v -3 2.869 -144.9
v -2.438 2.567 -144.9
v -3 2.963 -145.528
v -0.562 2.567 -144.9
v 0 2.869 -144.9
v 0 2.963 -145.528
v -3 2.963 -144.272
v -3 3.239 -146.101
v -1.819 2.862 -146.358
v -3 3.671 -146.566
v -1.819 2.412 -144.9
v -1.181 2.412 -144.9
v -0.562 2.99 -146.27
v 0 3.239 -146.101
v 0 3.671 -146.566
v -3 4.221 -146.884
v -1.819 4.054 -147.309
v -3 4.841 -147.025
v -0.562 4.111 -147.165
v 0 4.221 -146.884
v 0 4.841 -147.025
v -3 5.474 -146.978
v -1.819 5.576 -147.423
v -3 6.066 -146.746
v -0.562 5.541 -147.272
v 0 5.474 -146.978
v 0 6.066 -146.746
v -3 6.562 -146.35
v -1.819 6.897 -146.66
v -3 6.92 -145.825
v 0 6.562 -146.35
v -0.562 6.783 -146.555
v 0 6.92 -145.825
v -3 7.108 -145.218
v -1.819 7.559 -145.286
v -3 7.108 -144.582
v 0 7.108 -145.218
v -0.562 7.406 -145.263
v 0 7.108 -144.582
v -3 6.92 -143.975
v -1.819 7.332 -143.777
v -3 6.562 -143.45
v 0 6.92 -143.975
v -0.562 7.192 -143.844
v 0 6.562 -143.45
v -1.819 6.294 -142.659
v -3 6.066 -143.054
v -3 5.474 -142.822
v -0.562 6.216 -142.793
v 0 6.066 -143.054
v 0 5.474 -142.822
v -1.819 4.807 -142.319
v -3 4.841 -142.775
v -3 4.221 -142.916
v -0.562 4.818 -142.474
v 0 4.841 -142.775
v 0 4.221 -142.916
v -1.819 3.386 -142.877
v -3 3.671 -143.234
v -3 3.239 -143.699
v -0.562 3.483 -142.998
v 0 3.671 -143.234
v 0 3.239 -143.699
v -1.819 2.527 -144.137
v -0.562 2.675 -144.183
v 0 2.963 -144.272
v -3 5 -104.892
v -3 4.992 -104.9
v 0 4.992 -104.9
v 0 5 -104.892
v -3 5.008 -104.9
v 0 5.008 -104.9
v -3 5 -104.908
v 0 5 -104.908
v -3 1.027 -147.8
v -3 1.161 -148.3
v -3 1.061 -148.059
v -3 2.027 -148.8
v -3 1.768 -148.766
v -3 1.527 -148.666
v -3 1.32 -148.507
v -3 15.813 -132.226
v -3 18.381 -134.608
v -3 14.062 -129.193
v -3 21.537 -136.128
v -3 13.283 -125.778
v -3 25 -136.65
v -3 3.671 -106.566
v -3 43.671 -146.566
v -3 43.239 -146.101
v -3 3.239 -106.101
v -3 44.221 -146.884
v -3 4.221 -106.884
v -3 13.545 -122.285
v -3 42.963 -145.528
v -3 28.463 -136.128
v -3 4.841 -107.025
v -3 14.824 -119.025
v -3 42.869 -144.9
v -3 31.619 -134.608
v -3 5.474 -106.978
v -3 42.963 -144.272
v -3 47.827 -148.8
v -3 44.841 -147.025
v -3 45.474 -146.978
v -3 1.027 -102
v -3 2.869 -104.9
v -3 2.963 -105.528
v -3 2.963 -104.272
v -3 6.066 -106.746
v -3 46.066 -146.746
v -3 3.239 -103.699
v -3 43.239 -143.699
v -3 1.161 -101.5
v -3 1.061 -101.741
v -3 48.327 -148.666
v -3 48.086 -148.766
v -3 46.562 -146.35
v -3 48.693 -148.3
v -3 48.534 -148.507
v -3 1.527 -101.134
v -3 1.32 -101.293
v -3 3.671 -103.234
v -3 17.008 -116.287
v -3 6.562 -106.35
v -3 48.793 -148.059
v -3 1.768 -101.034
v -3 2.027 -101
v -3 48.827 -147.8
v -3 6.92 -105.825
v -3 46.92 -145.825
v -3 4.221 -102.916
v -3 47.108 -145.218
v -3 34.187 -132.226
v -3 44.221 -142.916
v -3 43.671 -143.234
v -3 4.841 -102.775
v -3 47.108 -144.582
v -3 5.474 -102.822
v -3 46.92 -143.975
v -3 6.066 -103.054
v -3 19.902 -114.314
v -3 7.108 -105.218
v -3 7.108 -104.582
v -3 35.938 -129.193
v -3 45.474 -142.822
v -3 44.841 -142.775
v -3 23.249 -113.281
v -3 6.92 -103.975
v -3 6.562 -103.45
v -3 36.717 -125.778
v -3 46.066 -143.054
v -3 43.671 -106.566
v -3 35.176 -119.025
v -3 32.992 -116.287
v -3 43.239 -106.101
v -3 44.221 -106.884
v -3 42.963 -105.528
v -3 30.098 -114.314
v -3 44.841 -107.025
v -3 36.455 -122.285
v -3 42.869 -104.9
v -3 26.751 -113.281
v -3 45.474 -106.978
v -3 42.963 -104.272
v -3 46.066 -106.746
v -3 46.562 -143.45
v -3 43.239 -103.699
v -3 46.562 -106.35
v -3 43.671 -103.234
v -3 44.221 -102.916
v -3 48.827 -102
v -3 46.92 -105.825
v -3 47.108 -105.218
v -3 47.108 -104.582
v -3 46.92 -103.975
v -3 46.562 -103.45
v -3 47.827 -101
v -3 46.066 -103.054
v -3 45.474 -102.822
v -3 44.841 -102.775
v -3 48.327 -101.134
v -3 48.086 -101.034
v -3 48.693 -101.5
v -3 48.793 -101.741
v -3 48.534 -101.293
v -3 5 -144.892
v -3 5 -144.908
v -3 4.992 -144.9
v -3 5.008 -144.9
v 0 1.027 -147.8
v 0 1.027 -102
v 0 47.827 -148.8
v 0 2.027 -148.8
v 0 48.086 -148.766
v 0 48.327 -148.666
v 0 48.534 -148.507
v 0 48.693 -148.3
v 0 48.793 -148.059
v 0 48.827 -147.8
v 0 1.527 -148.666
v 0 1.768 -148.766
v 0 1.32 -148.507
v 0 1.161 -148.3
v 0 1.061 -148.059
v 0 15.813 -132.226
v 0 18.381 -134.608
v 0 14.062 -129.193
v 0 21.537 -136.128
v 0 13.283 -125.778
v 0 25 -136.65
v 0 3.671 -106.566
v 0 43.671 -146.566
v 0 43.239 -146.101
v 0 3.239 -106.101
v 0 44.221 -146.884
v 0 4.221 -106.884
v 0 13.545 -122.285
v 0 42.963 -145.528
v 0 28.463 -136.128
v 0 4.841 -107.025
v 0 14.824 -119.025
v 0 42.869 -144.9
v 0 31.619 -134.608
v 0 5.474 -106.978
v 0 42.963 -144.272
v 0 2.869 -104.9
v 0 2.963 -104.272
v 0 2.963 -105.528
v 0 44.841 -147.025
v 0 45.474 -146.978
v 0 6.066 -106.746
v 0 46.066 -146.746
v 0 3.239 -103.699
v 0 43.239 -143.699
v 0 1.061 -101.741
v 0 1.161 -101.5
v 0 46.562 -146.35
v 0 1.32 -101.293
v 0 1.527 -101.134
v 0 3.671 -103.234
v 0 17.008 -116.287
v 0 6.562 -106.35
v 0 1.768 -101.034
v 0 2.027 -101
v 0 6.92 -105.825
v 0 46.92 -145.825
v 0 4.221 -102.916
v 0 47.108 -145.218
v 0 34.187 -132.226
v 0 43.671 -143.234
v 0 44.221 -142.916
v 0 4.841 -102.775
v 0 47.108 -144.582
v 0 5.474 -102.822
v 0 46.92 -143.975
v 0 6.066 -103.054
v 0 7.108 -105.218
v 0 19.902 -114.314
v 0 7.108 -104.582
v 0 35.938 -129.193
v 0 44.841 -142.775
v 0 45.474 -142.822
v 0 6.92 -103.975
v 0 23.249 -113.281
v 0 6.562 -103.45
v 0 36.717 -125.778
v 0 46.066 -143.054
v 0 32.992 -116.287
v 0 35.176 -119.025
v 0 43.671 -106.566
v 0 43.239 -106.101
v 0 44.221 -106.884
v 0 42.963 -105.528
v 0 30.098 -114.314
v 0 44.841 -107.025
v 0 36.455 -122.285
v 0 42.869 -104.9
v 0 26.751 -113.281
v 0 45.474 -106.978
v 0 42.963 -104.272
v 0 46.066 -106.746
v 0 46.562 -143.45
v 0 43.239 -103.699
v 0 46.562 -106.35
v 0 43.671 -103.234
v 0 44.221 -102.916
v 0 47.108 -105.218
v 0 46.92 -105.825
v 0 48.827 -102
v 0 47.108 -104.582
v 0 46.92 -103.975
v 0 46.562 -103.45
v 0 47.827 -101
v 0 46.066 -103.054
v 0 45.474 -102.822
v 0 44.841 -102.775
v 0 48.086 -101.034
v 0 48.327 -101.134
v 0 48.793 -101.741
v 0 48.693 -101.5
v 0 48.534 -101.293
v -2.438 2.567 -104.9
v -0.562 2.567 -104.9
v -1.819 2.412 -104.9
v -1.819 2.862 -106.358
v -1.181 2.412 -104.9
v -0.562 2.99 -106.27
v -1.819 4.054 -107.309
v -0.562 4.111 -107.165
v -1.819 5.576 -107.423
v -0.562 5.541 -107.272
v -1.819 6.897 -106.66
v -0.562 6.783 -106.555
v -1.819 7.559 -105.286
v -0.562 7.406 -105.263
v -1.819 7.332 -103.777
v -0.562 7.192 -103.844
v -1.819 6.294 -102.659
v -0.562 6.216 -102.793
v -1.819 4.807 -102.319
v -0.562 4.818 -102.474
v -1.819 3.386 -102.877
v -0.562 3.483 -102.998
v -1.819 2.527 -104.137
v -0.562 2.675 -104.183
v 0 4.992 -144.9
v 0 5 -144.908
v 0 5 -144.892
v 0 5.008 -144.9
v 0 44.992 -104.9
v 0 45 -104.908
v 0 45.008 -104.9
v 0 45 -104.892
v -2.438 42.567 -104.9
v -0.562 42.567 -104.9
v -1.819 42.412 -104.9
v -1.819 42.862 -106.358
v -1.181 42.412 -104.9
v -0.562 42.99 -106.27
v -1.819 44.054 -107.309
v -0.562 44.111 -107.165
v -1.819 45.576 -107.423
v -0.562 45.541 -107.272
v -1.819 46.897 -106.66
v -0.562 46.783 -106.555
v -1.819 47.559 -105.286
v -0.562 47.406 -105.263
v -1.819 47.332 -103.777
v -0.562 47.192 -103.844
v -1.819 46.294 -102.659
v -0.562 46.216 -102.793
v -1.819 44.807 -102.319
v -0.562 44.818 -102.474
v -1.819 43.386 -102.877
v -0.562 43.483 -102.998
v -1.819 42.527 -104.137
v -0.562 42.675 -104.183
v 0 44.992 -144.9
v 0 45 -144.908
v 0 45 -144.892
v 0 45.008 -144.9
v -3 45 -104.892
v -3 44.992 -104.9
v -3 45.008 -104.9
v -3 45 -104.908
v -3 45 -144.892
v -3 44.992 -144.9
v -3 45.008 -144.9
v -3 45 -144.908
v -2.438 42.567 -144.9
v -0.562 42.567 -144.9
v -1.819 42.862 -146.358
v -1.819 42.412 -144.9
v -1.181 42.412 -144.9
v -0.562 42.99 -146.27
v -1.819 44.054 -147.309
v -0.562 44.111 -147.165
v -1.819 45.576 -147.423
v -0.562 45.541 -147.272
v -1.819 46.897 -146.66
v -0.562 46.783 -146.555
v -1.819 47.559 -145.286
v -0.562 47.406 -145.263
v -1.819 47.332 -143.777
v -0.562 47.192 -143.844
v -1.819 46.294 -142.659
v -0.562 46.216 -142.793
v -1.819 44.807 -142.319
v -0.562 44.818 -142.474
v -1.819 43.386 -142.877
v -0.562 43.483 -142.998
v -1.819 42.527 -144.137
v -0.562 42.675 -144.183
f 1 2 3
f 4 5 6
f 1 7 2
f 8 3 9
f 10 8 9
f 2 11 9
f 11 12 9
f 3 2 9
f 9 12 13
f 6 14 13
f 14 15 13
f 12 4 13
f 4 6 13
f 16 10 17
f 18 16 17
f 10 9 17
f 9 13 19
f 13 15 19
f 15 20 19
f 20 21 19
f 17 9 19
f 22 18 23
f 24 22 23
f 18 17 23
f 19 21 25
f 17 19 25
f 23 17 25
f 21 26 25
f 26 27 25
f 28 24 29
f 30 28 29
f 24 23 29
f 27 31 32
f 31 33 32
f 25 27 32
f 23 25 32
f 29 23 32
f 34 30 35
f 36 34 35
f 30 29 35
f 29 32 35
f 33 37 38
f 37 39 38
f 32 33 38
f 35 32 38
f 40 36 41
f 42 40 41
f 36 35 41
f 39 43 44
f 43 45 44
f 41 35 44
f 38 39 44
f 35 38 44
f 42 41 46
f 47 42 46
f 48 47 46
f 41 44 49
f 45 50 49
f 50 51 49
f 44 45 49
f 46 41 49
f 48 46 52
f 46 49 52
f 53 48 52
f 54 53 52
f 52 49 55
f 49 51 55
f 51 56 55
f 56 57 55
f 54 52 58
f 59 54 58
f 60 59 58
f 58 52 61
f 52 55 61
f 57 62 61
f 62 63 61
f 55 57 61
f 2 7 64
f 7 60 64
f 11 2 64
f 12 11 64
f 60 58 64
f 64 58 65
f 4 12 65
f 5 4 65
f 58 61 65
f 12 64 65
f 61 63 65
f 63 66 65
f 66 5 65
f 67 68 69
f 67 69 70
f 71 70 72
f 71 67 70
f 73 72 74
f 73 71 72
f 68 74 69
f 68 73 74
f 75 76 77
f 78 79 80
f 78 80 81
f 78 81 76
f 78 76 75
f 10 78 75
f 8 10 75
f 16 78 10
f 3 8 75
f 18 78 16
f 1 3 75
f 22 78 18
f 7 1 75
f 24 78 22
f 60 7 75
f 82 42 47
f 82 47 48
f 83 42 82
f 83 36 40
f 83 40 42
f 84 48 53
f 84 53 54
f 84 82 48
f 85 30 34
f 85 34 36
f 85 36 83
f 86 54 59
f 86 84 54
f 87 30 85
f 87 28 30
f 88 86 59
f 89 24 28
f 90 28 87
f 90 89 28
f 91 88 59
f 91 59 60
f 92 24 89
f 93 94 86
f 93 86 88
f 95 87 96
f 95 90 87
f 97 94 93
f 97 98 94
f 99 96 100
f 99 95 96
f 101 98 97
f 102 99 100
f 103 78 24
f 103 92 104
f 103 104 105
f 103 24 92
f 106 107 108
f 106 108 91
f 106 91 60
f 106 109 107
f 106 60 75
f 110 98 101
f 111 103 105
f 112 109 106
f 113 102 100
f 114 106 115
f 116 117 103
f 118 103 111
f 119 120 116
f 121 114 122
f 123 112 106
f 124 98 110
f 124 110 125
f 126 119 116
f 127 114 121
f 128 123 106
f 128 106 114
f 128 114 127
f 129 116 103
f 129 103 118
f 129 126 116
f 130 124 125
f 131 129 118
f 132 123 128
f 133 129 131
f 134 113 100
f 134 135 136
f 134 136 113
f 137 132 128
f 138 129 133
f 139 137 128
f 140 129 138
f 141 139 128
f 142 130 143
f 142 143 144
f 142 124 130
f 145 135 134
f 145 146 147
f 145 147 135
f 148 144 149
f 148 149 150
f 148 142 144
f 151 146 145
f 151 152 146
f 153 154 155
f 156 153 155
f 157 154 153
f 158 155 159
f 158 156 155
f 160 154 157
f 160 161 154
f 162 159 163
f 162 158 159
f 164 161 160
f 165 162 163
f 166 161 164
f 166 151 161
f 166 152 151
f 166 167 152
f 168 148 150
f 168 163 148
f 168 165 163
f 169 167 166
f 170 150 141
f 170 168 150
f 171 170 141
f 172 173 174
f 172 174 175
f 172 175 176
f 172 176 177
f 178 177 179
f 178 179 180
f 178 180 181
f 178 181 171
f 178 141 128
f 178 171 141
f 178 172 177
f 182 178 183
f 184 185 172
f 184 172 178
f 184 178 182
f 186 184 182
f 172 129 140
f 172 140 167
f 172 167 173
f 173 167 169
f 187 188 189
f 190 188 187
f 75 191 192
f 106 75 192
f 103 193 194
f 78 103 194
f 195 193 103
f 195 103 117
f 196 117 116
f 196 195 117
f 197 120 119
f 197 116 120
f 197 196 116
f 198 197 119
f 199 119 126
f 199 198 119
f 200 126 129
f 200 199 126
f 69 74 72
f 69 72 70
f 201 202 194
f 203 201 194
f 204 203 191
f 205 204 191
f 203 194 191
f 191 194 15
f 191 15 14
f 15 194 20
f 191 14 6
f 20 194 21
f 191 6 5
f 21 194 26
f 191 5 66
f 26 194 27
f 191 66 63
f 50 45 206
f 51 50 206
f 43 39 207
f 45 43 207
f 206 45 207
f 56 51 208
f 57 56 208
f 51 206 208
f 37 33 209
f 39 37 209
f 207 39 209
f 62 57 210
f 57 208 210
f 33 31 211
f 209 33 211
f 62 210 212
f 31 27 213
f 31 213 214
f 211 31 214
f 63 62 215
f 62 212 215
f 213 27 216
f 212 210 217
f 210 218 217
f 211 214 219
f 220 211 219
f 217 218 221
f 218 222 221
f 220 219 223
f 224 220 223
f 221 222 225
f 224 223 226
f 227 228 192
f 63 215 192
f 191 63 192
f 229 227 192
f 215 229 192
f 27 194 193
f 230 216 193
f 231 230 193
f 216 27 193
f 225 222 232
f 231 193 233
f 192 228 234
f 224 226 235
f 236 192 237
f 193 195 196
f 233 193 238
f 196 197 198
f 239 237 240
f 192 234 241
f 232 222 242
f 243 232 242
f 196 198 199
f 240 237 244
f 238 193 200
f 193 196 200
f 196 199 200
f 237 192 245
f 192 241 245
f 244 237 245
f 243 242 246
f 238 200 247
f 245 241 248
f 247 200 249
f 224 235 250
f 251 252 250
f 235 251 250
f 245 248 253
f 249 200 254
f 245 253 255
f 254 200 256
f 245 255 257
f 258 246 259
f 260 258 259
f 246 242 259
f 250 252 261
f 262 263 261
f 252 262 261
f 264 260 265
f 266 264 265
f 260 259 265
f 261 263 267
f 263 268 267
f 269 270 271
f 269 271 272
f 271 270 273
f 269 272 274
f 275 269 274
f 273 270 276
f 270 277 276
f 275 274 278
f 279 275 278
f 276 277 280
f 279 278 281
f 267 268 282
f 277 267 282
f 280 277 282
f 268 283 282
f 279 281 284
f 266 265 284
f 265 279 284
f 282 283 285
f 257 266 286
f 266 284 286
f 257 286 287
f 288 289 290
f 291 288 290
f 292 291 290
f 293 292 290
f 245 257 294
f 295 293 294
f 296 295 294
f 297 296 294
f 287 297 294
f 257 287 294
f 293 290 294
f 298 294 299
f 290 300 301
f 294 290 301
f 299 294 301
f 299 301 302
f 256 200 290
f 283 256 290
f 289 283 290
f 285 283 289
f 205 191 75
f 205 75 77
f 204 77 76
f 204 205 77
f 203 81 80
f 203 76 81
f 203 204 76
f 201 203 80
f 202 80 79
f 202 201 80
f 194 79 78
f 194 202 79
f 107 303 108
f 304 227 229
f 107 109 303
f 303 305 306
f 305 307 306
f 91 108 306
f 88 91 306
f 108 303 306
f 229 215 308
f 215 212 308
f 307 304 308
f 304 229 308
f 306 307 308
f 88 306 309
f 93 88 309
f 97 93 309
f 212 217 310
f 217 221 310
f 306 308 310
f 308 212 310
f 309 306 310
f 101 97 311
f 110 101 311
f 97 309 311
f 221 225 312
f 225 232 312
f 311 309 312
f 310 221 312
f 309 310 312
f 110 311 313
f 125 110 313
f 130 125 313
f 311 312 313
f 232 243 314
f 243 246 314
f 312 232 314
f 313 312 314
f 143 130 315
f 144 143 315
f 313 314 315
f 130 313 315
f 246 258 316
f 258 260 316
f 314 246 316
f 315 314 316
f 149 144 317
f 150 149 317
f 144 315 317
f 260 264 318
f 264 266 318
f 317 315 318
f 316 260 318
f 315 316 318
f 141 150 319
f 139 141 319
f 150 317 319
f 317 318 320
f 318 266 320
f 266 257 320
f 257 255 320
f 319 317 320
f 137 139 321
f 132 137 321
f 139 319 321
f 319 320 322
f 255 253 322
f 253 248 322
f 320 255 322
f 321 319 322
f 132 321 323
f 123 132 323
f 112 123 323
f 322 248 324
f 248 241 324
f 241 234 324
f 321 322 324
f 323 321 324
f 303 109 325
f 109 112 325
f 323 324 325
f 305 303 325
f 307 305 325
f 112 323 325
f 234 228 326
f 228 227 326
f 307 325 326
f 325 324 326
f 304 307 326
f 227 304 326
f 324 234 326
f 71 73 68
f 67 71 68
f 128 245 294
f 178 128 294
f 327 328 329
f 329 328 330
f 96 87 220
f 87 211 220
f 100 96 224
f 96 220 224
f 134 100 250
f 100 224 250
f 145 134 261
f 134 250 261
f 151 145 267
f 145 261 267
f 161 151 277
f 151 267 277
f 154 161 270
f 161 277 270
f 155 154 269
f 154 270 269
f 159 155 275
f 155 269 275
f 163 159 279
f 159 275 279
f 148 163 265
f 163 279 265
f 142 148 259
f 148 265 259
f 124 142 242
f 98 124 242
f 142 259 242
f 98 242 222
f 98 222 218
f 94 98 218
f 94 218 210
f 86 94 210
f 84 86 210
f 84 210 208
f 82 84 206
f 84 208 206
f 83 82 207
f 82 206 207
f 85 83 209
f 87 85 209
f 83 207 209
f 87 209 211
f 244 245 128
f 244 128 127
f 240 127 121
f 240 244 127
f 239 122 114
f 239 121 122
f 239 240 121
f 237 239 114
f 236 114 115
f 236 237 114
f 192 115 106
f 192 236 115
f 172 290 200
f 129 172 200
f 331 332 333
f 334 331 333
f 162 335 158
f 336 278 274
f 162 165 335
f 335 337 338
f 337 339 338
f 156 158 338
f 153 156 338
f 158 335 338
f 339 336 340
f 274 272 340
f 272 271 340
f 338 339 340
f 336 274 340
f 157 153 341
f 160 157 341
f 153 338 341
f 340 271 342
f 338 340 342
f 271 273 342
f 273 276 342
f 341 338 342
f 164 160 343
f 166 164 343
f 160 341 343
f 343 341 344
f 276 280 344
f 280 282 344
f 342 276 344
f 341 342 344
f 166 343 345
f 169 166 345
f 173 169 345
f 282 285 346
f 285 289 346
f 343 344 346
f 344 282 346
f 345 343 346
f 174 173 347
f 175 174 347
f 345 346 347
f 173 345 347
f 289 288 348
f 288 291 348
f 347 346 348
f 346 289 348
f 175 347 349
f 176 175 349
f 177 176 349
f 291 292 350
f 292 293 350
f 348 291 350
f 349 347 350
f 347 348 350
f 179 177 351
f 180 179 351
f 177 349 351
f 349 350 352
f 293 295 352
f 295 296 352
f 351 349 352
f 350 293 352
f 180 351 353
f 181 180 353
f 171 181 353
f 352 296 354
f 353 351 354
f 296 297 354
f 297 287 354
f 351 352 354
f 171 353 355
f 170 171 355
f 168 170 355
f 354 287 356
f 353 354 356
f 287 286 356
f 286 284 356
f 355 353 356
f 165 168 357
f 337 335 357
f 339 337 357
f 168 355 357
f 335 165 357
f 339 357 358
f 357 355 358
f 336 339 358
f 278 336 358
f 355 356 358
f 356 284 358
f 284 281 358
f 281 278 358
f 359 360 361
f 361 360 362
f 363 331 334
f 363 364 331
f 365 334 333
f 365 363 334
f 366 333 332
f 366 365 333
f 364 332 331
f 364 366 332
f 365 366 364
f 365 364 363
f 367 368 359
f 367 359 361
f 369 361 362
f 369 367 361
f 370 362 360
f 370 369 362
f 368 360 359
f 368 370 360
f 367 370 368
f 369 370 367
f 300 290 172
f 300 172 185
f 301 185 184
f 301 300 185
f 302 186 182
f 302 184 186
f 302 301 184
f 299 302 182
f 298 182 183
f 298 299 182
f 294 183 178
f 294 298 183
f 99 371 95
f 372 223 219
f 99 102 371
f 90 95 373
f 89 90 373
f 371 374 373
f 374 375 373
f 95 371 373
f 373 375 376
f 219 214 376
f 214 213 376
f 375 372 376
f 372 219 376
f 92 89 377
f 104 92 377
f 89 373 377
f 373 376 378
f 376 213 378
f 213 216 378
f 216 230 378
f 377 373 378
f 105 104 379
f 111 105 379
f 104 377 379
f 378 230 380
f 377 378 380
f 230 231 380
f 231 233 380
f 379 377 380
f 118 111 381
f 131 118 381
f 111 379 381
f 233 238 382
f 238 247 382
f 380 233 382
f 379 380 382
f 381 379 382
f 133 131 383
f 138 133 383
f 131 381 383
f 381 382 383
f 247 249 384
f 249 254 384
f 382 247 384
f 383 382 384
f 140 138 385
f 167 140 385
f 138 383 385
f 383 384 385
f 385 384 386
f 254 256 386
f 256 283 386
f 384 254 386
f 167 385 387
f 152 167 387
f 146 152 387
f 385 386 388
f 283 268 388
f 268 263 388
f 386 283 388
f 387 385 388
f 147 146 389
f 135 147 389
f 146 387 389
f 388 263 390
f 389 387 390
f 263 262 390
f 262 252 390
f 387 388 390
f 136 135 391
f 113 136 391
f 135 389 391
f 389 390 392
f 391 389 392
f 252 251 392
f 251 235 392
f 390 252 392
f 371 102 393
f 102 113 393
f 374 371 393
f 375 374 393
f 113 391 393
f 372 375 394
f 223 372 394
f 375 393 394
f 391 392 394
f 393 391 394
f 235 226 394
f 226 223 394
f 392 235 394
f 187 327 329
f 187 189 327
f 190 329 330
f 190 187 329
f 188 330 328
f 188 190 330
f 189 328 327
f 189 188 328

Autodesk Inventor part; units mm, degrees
ref_plane "YZ Plane" through (0, 0, 0) normal (1, 0, 0) x (0, 1, 0)
ref_plane "XZ Plane" through (0, 0, 0) normal (0, 1, 0) x (-1, 0, 0)
ref_plane "XY Plane" through (0, 0, 0) normal (0, 0, 1) x (1, 0, 0)
ref_plane "Arbeitsebene1" through (0, 0, -149.8) normal (-1, 0, 0) x (0, 0, 1)
sketch "Skizze1" plane through (0, 0, -149.8) normal (-1, 0, 0) x (0, 0, 1)
  circle A0 centre (44.9, 5) radius 1.5 construction
  circle A1 centre (4.9, 5) radius 1.5 construction
  circle A2 centre (4.9, 45) radius 1.6 construction
  circle A3 centre (44.9, 45) radius 1.6 construction
  line L0 (39.5269, 16.1776) -> (39.5269, 39.7) construction
  line L1 (16.0815, 10.3) -> (33.7185, 10.3) construction
  line L2 (10.2731, 16.1776) -> (10.2731, 39.7) construction
  circle A4 centre (24.9, 24.9269) radius 14.6269 construction
  line L3 (2, 49.8269) -> (47.8, 49.8269)
  line L4 (49.8, 47.8269) -> (49.8, 2.0269)
  line L5 (47.8, 0.0269) -> (2, 0.0269)
  line L6 (0, 2.0269) -> (0, 47.8269)
  line L7 (0, 49.8269) -> (49.8, 0.0269) construction
  line L8 (49.8, 49.8269) -> (0, 0.0269) construction
  arc A5 (47.8, 0.0269) -> (49.8, 2.0269) centre (47.8, 2.0269) ccw
  arc A6 (0, 2.0269) -> (2, 0.0269) centre (2, 2.0269) ccw
  arc A7 (2, 49.8269) -> (0, 47.8269) centre (2, 47.8269) ccw
  arc A8 (49.8, 47.8269) -> (47.8, 49.8269) centre (47.8, 47.8269) ccw
  line L9 (2, 1.0269) -> (47.8, 1.0269)
  arc A9 (47.8, 1.0269) -> (48.8, 2.0269) centre (47.8, 2.0269) ccw
  line L10 (48.8, 2.0269) -> (48.8, 47.8269)
  arc A10 (48.8, 47.8269) -> (47.8, 48.8269) centre (47.8, 47.8269) ccw
  line L11 (47.8, 48.8269) -> (2, 48.8269)
  arc A11 (2, 48.8269) -> (1, 47.8269) centre (2, 47.8269) ccw
  line L12 (1, 47.8269) -> (1, 2.0269)
  arc A12 (1, 2.0269) -> (2, 1.0269) centre (2, 2.0269) ccw
  point P0 (149.8, 0)
extrude "Extrusion1" add sketch "Skizze1" along normal blind 3 contours A12 L12 A11 L11 A10 L10 A9 L9
ref_plane "Arbeitsebene2" through (0, 5, -104.9) normal (0, 0, 1) x (1, 0, 0)
sketch "Skizze2" plane through (0, 5, -104.9) normal (0, 0, 1) x (1, 0, 0)
  line L0 (0, 5.3) -> (7, 5.3) projected
  line L1 (0, 8.3139) -> (7.3731, 8.3139)
  line L2 (0, -2.9731) -> (0, 42.8269) projected
  line L3 (0, 6.807) -> (-3, 6.807)
  line L4 (-3, -2.9731) -> (-3, 42.8269) projected
  circle A0 centre (-1.5, 6.807) radius 2.6
  line L5 (1.1, 6.807) -> (-4.1, 6.807)
  line L6 (0, 1.6861) -> (7.3731, 1.6861)
  line L7 (2.4, -2.5) -> (8, -2.5) projected
  line L8 (15, -1.5) -> (6.4, -1.5)
  line L9 (10.2731, 1.5) -> (6.4, 1.5)
  line L10 (0, -0.0077) -> (-3, -0.0077)
  circle A1 centre (-1.5, -0.0077) radius 2.6
  line L11 (1.1, -0.0077) -> (-4.1, -0.0077)
  line L12 (-7.92, 0) -> (18.82, 0) projected
  point P0 (0, -5)
  point P1 (0, 1.4993)
  dimension "d6" = 1.507
  dimension "d7" = 5.2
  dimension "d9" = 5.2
revolve "Umdrehung2" cut sketch "Skizze2" angle 360 about axis through (47.3, 5, -104.9) along (1, 0, 0) contours L11 A1 L2 | L2 A1 L4 L10 | L4 A1 L11
pattern_linear "Rechteckige Anordnung1" count 2 spacing 40 along (0, 1, 0) count 2 spacing 40 along (0, 0, -1) of "Umdrehung2"
sketch "Skizze3" plane through (0, 0, -149.8) normal (1, 0, 0) x (0, 0, -1)
  point P0 (-149.8, 0)
sketch "Skizze4" plane through (0, 0, -149.8) normal (1, 0, 0) x (0, 0, -1)
  circle A0 centre (-24.9, 25) radius 11.45
  circle A1 centre (-24.9, 25) radius 11.75
  point P0 (-149.8, 0)
  dimension "d18" = 0.3
extrude "Extrusion2" cut sketch "Skizze4" against normal blind 10 contours A0 | A1
properties part number "30_Adapterplate_Eyepiece"
